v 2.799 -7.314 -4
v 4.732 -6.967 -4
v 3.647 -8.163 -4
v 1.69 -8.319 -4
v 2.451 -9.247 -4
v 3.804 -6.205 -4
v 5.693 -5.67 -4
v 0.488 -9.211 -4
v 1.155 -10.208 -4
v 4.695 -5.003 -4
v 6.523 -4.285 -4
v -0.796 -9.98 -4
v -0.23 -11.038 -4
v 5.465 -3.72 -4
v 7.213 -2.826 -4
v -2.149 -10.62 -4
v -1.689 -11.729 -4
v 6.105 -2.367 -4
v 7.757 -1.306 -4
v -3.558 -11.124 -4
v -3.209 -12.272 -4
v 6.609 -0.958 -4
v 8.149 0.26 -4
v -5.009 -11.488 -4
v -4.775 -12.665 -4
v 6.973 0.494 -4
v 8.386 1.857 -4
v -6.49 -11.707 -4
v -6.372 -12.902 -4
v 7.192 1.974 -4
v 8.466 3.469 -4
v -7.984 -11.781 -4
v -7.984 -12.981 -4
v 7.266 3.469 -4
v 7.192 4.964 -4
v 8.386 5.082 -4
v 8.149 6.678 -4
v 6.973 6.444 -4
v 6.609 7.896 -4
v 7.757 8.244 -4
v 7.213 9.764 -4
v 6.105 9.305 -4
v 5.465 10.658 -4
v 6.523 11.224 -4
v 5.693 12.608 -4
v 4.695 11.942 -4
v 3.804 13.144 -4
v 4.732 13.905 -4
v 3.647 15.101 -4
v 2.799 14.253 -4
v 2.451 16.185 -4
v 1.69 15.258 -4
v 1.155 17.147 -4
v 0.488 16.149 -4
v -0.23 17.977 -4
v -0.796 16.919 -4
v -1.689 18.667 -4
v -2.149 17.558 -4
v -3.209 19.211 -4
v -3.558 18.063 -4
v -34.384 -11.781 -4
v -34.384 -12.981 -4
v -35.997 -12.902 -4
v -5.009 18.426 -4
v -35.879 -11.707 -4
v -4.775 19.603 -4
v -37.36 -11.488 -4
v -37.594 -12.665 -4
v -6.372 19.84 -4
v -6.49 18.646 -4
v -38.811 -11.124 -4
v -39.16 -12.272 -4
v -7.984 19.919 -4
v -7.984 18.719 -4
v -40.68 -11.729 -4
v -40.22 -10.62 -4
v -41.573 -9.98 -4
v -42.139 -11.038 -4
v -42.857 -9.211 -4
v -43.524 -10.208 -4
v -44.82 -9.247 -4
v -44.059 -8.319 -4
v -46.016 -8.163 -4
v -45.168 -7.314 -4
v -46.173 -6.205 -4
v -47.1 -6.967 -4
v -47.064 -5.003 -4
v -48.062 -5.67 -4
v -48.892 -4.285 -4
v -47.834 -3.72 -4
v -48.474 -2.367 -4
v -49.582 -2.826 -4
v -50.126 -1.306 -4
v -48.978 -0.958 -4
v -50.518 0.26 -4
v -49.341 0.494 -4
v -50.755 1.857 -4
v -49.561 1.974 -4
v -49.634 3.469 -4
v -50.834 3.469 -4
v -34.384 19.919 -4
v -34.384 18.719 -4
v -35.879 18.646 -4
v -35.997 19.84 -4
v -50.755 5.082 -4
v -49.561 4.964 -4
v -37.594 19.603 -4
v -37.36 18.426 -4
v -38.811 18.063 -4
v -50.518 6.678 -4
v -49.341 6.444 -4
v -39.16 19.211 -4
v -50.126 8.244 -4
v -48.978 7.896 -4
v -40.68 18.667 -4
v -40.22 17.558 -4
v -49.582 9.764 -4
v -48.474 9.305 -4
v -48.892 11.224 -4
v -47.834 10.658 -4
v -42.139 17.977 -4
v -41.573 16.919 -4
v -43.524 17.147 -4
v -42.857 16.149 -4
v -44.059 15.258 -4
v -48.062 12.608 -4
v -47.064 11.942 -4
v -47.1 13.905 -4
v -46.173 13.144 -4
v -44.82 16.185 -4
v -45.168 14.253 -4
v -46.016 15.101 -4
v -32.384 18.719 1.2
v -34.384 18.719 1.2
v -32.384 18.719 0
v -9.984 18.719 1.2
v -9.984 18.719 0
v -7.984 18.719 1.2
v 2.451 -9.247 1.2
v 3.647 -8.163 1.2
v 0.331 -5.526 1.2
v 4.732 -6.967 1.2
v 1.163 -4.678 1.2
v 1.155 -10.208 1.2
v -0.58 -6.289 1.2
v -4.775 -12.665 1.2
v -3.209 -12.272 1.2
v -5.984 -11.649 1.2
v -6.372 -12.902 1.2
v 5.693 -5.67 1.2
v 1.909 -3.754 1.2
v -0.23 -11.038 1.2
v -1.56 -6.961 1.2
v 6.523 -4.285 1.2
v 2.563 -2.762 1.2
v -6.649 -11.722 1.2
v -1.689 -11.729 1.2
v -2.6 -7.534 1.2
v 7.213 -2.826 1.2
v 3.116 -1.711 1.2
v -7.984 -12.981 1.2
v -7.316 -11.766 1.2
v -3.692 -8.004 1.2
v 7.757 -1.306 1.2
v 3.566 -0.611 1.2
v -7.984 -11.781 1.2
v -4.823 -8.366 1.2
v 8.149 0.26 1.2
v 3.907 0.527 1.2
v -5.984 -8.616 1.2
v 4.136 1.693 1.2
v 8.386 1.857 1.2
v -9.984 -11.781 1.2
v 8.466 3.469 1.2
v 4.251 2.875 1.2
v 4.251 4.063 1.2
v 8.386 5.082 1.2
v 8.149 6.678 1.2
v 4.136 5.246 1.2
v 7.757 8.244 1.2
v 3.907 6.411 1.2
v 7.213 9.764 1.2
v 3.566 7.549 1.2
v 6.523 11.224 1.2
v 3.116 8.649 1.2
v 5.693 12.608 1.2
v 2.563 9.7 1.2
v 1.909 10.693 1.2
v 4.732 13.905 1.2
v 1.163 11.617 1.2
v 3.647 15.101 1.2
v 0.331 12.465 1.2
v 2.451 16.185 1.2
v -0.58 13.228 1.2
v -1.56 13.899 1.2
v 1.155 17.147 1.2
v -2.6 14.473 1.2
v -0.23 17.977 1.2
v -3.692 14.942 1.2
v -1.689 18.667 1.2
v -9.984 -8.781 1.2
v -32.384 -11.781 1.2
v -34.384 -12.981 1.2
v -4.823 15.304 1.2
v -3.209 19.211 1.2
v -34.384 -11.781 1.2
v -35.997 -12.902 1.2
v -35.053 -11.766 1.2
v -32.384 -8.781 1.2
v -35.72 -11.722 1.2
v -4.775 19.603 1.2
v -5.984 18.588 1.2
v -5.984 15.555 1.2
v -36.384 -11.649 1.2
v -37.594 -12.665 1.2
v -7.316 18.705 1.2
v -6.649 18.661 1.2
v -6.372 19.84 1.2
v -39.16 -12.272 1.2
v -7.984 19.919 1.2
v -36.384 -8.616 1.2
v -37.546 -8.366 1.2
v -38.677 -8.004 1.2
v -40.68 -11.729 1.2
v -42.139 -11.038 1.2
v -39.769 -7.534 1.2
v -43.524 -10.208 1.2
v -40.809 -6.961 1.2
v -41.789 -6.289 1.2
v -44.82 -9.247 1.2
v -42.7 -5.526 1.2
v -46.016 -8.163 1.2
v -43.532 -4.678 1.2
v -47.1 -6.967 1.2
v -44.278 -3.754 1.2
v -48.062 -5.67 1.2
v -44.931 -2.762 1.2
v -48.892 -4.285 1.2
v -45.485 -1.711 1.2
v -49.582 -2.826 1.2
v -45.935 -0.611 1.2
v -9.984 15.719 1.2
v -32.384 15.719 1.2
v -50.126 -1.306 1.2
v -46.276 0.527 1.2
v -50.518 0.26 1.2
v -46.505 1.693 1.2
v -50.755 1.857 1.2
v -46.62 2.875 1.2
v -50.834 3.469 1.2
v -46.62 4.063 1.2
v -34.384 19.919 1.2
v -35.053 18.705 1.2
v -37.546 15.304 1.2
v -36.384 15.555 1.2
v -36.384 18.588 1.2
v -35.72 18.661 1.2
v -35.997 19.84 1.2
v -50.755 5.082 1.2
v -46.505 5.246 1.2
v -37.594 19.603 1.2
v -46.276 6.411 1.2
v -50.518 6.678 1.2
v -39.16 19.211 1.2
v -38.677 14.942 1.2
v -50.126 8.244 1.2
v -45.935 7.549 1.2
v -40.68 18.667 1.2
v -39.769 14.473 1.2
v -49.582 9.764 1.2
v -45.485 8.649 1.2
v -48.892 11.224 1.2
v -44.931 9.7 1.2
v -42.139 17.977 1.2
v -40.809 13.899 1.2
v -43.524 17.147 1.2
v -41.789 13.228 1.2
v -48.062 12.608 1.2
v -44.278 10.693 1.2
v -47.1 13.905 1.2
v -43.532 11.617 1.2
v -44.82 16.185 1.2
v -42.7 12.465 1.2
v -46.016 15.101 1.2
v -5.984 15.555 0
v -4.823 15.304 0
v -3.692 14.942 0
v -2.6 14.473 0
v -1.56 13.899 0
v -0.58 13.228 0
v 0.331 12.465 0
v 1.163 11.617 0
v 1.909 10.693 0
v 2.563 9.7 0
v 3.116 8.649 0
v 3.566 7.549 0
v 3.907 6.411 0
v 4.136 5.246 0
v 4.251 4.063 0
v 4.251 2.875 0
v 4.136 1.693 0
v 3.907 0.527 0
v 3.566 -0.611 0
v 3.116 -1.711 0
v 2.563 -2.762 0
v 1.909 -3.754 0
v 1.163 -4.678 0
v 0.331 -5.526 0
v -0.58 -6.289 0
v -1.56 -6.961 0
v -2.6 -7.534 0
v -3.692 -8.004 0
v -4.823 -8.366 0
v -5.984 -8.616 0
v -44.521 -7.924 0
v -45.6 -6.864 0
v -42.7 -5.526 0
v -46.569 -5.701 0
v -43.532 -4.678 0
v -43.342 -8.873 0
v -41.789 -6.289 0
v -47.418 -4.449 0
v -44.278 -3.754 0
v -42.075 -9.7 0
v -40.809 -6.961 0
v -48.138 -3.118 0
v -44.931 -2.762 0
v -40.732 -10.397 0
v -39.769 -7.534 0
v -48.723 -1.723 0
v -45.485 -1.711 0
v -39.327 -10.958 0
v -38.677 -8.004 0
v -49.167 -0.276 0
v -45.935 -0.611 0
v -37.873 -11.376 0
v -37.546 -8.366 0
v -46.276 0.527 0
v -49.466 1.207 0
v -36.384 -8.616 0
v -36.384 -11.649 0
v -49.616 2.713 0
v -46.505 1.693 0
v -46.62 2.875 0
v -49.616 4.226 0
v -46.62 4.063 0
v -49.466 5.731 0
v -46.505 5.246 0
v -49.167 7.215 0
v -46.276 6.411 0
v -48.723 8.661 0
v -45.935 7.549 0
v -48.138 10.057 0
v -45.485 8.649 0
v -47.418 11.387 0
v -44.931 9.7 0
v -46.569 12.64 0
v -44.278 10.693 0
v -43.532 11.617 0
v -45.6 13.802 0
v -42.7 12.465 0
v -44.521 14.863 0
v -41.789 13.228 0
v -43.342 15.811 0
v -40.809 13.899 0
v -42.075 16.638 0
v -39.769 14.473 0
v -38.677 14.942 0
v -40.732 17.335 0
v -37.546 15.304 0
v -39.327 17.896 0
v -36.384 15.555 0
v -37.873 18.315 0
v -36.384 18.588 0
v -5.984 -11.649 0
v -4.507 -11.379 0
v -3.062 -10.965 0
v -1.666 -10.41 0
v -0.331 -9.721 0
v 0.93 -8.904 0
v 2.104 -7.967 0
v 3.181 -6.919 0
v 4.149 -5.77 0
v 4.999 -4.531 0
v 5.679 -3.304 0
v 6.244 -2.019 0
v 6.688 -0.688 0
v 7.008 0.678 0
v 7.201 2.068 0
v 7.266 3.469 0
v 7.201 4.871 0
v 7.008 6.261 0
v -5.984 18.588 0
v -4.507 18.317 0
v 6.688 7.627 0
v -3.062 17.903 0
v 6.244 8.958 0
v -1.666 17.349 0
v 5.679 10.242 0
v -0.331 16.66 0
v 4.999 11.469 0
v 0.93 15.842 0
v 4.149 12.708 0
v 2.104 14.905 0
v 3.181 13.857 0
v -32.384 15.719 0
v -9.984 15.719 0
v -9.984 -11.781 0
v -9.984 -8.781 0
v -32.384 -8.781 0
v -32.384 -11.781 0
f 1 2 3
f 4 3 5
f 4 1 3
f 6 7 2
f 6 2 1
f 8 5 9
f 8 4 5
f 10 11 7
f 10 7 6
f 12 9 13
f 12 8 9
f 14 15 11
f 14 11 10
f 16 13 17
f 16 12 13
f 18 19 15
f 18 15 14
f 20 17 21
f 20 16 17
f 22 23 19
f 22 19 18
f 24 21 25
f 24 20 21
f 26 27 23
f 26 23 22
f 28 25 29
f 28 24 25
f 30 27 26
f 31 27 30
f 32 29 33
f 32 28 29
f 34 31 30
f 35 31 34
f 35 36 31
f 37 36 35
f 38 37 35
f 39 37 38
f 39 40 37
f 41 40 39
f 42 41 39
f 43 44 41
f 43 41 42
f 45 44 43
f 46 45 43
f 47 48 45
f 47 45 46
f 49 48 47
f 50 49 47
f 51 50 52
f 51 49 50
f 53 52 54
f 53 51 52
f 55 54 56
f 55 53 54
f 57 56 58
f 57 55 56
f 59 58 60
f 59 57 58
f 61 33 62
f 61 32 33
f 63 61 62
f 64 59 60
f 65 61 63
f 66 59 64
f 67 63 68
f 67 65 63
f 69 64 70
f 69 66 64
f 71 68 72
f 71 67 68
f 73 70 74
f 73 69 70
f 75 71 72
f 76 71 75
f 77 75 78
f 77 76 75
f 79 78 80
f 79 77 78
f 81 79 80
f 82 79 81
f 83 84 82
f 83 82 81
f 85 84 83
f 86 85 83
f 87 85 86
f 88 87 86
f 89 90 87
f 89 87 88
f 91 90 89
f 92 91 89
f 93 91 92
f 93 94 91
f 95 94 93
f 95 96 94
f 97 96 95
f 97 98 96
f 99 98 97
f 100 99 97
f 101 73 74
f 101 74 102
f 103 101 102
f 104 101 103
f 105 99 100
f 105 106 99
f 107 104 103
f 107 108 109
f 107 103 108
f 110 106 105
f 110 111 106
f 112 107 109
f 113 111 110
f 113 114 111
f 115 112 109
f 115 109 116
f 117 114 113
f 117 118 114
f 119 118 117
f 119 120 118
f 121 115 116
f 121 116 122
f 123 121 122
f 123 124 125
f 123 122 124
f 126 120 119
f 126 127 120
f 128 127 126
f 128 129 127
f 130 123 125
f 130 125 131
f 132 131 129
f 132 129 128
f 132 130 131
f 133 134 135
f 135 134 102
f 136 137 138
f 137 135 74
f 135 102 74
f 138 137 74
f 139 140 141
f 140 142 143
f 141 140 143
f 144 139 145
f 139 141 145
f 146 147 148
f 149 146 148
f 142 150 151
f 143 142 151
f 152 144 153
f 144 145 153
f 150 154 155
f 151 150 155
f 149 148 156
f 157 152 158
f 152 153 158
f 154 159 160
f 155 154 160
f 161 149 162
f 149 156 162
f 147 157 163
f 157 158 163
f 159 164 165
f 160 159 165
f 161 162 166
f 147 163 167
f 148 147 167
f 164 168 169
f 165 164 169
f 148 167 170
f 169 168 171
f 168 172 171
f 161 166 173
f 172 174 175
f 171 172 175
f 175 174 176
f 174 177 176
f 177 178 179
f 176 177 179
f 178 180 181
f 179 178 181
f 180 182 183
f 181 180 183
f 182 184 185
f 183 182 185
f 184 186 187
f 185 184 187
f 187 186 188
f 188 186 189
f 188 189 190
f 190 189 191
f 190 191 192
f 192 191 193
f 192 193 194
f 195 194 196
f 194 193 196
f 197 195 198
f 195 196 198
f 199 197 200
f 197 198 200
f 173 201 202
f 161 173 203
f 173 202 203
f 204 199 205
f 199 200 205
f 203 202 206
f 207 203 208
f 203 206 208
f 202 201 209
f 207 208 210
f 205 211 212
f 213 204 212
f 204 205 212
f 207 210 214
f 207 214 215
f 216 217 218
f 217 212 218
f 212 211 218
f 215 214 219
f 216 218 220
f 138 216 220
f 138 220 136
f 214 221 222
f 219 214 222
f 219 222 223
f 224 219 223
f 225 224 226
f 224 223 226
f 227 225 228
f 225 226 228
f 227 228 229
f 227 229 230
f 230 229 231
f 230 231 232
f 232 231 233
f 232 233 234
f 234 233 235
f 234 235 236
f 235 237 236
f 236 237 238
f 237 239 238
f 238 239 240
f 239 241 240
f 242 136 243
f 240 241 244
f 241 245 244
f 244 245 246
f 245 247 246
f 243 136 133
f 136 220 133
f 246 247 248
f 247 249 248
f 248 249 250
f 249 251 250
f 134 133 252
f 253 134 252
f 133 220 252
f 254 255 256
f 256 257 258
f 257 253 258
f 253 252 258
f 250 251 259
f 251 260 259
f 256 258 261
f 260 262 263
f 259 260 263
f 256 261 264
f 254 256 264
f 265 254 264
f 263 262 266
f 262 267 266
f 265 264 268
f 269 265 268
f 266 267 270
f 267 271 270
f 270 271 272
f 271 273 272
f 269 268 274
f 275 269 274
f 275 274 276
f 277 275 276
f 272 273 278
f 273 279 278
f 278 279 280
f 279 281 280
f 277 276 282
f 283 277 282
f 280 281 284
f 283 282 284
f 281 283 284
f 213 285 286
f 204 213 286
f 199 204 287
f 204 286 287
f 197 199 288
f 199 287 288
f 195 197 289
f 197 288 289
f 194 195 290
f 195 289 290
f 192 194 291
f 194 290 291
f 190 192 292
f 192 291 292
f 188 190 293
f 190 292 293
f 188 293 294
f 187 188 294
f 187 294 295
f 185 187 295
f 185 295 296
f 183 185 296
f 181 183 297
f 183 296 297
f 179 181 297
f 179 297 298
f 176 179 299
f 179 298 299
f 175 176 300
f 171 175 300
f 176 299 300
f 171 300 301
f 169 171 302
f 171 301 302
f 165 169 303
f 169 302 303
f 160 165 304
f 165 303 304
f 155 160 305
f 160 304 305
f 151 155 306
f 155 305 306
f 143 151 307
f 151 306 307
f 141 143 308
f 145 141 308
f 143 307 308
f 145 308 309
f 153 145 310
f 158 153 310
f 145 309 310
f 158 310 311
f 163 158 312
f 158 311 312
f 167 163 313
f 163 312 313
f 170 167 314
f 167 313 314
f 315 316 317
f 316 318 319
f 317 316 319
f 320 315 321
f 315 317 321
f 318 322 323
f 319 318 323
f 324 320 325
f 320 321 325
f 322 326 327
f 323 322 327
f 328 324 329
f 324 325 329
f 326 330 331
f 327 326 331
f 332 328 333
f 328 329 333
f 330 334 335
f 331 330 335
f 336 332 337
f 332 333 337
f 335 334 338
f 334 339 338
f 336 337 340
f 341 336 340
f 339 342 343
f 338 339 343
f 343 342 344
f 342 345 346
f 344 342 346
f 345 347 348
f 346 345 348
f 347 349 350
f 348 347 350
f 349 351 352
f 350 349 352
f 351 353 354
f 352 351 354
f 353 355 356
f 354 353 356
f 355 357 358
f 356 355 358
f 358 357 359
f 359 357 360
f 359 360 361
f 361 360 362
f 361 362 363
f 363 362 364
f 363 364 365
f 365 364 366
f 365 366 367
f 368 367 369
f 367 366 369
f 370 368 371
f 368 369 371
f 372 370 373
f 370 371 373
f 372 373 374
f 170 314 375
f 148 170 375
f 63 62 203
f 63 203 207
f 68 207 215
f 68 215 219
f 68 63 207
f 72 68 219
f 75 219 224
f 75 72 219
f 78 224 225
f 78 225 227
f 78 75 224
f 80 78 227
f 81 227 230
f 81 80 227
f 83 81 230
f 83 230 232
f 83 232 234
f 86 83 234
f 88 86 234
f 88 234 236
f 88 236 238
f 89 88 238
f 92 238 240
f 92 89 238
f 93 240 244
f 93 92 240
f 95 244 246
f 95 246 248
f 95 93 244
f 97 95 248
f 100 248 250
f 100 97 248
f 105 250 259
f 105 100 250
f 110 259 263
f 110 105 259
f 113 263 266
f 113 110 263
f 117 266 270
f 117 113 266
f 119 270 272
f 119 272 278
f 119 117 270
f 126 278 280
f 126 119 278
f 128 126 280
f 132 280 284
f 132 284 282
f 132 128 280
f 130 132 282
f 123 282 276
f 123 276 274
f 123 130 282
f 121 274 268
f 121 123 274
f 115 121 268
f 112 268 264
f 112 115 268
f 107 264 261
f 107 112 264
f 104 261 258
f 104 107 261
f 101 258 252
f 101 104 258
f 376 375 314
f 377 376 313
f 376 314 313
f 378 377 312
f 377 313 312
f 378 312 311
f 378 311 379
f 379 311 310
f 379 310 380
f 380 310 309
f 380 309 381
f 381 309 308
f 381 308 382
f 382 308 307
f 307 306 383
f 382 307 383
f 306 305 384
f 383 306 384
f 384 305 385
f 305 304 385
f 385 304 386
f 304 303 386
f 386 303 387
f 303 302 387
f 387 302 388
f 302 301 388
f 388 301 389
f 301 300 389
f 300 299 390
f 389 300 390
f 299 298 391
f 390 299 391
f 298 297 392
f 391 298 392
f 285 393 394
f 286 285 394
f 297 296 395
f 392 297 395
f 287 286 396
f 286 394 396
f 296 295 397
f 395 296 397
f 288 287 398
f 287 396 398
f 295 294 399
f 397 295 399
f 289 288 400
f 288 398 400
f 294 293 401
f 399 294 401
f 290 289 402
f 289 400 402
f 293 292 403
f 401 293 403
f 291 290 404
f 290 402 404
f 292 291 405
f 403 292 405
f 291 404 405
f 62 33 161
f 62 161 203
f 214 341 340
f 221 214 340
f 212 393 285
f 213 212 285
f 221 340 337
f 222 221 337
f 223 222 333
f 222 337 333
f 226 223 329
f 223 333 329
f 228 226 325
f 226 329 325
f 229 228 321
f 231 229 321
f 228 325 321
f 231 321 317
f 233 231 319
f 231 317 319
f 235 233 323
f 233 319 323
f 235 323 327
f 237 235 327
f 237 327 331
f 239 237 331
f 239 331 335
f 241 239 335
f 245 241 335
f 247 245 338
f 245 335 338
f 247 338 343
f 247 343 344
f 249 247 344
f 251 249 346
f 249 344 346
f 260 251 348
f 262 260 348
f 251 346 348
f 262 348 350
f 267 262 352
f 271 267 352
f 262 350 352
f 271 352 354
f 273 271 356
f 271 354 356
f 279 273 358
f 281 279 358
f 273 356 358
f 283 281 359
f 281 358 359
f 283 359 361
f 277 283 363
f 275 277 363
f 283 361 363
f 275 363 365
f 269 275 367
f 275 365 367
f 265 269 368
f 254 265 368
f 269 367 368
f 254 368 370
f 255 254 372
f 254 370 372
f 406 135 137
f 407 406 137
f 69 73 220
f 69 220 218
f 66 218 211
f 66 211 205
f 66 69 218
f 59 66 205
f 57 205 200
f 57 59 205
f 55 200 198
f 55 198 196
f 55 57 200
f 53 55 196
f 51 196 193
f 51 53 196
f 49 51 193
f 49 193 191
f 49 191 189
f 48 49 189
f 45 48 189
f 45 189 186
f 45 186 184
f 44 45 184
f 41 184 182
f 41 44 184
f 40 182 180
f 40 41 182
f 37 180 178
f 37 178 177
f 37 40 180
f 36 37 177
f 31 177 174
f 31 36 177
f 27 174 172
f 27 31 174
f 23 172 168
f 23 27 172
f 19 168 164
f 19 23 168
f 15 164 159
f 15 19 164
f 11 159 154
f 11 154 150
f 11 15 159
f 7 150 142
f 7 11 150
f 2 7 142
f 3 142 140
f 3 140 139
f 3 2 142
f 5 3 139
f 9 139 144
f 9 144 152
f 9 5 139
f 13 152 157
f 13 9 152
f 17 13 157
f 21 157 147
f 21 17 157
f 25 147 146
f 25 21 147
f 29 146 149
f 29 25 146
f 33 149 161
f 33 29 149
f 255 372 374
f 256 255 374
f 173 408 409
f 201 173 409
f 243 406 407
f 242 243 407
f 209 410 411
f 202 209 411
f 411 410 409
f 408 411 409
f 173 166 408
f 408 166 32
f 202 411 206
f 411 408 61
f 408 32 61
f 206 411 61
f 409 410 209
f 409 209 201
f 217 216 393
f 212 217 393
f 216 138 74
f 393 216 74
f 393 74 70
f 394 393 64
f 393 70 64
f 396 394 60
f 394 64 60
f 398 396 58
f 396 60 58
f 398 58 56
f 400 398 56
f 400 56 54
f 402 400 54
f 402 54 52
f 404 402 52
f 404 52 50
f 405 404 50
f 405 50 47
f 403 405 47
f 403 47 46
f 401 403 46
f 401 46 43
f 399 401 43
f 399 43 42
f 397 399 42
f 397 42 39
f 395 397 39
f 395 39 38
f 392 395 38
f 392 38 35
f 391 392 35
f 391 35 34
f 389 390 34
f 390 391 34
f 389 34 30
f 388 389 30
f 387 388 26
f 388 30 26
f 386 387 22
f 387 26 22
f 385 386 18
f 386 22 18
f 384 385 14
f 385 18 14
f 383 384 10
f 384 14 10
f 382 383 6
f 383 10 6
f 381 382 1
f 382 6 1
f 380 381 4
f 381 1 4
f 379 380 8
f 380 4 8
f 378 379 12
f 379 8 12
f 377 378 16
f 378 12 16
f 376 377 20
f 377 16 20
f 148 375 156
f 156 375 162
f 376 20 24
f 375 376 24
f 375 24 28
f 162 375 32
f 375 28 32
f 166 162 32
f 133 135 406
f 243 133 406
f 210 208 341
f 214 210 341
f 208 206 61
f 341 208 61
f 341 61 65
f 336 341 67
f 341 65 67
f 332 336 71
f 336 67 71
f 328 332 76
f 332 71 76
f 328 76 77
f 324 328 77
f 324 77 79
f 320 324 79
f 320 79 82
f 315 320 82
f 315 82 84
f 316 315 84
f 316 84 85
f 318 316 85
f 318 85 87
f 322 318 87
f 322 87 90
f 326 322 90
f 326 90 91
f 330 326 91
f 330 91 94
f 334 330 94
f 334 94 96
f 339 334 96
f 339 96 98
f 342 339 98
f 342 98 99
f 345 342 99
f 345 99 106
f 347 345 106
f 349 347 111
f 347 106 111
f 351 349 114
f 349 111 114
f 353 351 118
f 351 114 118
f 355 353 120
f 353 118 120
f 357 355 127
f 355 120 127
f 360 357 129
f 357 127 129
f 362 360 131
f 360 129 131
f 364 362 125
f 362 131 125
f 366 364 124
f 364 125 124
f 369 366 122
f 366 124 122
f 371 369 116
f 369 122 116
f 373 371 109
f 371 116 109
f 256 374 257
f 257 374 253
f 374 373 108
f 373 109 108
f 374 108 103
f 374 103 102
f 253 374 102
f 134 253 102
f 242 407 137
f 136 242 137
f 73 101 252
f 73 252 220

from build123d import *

# Parameters (mm, degrees)
BOSS_EXTRUDE1_DEPTH      = 1.2
BOSS_EXTRUDE1_DEPTH_BACK = 4
SKETCH3_W                = 22.4
SKETCH3_H                = 1.5
BOSS_EXTRUDE2_DEPTH      = 1.2


with BuildPart() as part:
    # Sketch1 → Boss-Extrude1 (new, two sides: drawn at the far end of the back side and taken through both)
    with BuildSketch(Plane.XY.offset(-BOSS_EXTRUDE1_DEPTH_BACK)):
        with BuildLine():
            Line((-34.384444189, 19.919216619), (-7.984444189, 19.919216619))
            ThreePointArc((-7.984444189, 19.919216619), (8.465555811, 3.469216619), (-7.984444189, -12.980783381))
            Line((-7.984444189, -12.980783381), (-34.384444189, -12.980783381))
            ThreePointArc((-34.384444189, -12.980783381), (-50.834444189, 3.469216619), (-34.384444189, 19.919216619))
        make_face()
        with BuildLine():
            Line((-34.384444189, 18.719216619), (-7.984444189, 18.719216619))
            ThreePointArc((-7.984444189, 18.719216619), (7.265555811, 3.469216619), (-7.984444189, -11.780783381))
            Line((-7.984444189, -11.780783381), (-34.384444189, -11.780783381))
            ThreePointArc((-34.384444189, -11.780783381), (-49.634444189, 3.469216619), (-34.384444189, 18.719216619))
        make_face(mode=Mode.SUBTRACT)
    extrude(amount=BOSS_EXTRUDE1_DEPTH + BOSS_EXTRUDE1_DEPTH_BACK)

    # Sketch3 → Boss-Extrude2 (add)
    with BuildSketch(Plane.XY):
        with BuildLine():
            Line((-36.384444189, 17.07298448), (-36.384444189, 18.587500252))
            ThreePointArc((-36.384444189, 18.587500252), (-49.634444189, 3.469216619), (-36.384444189, -11.649067014))
            Line((-36.384444189, -11.649067014), (-36.384444189, -10.134551241))
            ThreePointArc((-36.384444189, -10.134551241), (-48.134444189, 3.469216619), (-36.384444189, 17.07298448))
        make_face()
        with BuildLine():
            Line((-36.384444189, 15.554848584), (-36.384444189, 17.07298448))
            ThreePointArc((-36.384444189, 17.07298448), (-48.134444189, 3.469216619), (-36.384444189, -10.134551241))
            Line((-36.384444189, -10.134551241), (-36.384444189, -8.616415346))
            ThreePointArc((-36.384444189, -8.616415346), (-46.634444189, 3.469216619), (-36.384444189, 15.554848584))
        make_face()
        with Locations((-21.184444189, 17.969216619)):
            Rectangle(SKETCH3_W, SKETCH3_H)
        with Locations((-21.184444189, 16.469216619)):
            Rectangle(SKETCH3_W, SKETCH3_H)
        with BuildLine():
            ThreePointArc((4.998717984, 11.469216619), (0.309606549, 16.266529711), (-5.984444189, 18.587500252))
            Line((-5.984444189, 18.587500252), (-5.984444189, 17.07298448))
            ThreePointArc((-5.984444189, 17.07298448), (-0.822090303, 15.206472977), (3.198690434, 11.469216619))
            Line((3.198690434, 11.469216619), (4.998717984, 11.469216619))
        make_face()
        with BuildLine():
            ThreePointArc((3.198690434, 11.469216619), (-0.822090303, 15.206472977), (-5.984444189, 17.07298448))
            Line((-5.984444189, 17.07298448), (-5.984444189, 15.554848584))
            ThreePointArc((-5.984444189, 15.554848584), (4.265555811, 3.469216619), (-5.984444189, -8.616415346))
            Line((-5.984444189, -8.616415346), (-5.984444189, -10.134551241))
            ThreePointArc((-5.984444189, -10.134551241), (-0.822090303, -8.268039739), (3.198690434, -4.530783381))
            Line((3.198690434, -4.530783381), (4.998717984, -4.530783381))
            ThreePointArc((4.998717984, -4.530783381), (7.265555811, 3.469216619), (4.998717984, 11.469216619))
            Line((4.998717984, 11.469216619), (3.198690434, 11.469216619))
        make_face()
        with BuildLine():
            ThreePointArc((-5.984444189, -11.649067014), (0.309606549, -9.328096472), (4.998717984, -4.530783381))
            Line((4.998717984, -4.530783381), (3.198690434, -4.530783381))
            ThreePointArc((3.198690434, -4.530783381), (-0.822090303, -8.268039739), (-5.984444189, -10.134551241))
            Line((-5.984444189, -10.134551241), (-5.984444189, -11.649067014))
        make_face()
        with Locations((-21.184444189, -9.530783381)):
            Rectangle(SKETCH3_W, SKETCH3_H)
        with Locations((-21.184444189, -11.030783381)):
            Rectangle(SKETCH3_W, SKETCH3_H)
    extrude(amount=BOSS_EXTRUDE2_DEPTH)


solid = part.part
